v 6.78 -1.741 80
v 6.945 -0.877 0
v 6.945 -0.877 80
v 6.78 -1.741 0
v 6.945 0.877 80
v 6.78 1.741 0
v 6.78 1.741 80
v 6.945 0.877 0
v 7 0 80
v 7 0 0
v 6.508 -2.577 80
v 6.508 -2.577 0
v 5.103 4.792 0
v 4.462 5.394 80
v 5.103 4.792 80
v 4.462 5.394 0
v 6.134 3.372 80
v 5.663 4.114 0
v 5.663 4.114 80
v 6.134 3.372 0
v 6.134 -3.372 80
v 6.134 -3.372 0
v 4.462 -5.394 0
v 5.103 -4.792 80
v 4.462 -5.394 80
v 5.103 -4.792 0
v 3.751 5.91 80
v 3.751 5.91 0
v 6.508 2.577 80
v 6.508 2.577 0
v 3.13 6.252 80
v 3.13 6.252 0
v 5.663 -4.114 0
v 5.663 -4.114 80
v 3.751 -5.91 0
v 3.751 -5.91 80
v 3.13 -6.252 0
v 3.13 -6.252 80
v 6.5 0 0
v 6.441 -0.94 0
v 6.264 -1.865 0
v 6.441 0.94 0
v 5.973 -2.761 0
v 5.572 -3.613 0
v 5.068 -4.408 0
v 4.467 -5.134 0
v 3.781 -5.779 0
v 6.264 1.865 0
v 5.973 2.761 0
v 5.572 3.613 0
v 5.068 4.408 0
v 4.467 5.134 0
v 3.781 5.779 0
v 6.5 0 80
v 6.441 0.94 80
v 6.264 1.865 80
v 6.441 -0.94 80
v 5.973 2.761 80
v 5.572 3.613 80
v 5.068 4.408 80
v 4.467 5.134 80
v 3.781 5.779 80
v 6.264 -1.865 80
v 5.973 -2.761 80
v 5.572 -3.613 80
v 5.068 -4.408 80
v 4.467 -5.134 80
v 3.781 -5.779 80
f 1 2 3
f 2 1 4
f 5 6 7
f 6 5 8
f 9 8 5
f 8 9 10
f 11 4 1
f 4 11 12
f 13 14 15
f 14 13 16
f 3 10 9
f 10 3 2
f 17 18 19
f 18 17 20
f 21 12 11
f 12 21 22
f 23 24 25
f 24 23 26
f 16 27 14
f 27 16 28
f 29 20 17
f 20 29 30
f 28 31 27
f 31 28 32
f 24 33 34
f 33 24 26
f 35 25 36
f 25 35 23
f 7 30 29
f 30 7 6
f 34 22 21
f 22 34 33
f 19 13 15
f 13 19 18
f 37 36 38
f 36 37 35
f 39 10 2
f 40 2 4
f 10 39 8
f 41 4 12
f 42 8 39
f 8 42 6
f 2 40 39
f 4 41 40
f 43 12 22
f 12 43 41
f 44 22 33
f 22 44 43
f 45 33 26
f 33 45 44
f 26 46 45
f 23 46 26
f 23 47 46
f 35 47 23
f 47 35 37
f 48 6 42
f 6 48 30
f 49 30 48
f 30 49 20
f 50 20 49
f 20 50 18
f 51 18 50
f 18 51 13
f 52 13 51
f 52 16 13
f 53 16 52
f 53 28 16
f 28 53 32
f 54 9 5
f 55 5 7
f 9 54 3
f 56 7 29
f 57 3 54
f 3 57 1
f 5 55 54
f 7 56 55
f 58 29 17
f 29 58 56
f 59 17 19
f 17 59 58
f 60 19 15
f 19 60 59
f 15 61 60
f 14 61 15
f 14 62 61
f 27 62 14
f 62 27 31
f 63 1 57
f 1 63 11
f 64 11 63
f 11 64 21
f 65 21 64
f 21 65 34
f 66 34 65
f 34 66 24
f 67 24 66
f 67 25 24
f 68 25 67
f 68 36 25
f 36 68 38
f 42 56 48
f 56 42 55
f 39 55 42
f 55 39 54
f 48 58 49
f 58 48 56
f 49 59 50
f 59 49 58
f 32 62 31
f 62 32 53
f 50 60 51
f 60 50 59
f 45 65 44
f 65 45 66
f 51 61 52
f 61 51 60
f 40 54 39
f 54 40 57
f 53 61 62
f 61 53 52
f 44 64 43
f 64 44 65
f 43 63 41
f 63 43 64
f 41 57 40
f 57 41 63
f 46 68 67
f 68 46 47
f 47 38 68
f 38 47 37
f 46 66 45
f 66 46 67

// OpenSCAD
$fn = 50;


difference() {
	union() {
		cylinder(h = 80, r = 7.0000000000);
		translate(v = [-4.0000000000, 0, 0]) {
			cylinder(h = 80, r = 7.0000000000);
		}
	}
	union() {
		cylinder(h = 80, r = 3.2500000000);
		cylinder(h = 80, r = 1.8000000000);
		cylinder(h = 80, r = 1.8000000000);
		cylinder(h = 80, r = 1.8000000000);
		translate(v = [-8.5000000000, 0, 0]) {
			hull() {
				translate(v = [-3.7500000000, 0.0000000000, 0]) {
					cylinder(h = 80, r = 7.5000000000);
				}
				translate(v = [3.7500000000, 0.0000000000, 0]) {
					cylinder(h = 80, r = 7.5000000000);
				}
				translate(v = [-3.7500000000, -0.0000000000, 0]) {
					cylinder(h = 80, r = 7.5000000000);
				}
				translate(v = [3.7500000000, -0.0000000000, 0]) {
					cylinder(h = 80, r = 7.5000000000);
				}
			}
		}
		translate(v = [-1.0000000000, 0, 0.0000000000]) {
			cylinder(h = 80, r = 7.5000000000);
		}
	}
}
